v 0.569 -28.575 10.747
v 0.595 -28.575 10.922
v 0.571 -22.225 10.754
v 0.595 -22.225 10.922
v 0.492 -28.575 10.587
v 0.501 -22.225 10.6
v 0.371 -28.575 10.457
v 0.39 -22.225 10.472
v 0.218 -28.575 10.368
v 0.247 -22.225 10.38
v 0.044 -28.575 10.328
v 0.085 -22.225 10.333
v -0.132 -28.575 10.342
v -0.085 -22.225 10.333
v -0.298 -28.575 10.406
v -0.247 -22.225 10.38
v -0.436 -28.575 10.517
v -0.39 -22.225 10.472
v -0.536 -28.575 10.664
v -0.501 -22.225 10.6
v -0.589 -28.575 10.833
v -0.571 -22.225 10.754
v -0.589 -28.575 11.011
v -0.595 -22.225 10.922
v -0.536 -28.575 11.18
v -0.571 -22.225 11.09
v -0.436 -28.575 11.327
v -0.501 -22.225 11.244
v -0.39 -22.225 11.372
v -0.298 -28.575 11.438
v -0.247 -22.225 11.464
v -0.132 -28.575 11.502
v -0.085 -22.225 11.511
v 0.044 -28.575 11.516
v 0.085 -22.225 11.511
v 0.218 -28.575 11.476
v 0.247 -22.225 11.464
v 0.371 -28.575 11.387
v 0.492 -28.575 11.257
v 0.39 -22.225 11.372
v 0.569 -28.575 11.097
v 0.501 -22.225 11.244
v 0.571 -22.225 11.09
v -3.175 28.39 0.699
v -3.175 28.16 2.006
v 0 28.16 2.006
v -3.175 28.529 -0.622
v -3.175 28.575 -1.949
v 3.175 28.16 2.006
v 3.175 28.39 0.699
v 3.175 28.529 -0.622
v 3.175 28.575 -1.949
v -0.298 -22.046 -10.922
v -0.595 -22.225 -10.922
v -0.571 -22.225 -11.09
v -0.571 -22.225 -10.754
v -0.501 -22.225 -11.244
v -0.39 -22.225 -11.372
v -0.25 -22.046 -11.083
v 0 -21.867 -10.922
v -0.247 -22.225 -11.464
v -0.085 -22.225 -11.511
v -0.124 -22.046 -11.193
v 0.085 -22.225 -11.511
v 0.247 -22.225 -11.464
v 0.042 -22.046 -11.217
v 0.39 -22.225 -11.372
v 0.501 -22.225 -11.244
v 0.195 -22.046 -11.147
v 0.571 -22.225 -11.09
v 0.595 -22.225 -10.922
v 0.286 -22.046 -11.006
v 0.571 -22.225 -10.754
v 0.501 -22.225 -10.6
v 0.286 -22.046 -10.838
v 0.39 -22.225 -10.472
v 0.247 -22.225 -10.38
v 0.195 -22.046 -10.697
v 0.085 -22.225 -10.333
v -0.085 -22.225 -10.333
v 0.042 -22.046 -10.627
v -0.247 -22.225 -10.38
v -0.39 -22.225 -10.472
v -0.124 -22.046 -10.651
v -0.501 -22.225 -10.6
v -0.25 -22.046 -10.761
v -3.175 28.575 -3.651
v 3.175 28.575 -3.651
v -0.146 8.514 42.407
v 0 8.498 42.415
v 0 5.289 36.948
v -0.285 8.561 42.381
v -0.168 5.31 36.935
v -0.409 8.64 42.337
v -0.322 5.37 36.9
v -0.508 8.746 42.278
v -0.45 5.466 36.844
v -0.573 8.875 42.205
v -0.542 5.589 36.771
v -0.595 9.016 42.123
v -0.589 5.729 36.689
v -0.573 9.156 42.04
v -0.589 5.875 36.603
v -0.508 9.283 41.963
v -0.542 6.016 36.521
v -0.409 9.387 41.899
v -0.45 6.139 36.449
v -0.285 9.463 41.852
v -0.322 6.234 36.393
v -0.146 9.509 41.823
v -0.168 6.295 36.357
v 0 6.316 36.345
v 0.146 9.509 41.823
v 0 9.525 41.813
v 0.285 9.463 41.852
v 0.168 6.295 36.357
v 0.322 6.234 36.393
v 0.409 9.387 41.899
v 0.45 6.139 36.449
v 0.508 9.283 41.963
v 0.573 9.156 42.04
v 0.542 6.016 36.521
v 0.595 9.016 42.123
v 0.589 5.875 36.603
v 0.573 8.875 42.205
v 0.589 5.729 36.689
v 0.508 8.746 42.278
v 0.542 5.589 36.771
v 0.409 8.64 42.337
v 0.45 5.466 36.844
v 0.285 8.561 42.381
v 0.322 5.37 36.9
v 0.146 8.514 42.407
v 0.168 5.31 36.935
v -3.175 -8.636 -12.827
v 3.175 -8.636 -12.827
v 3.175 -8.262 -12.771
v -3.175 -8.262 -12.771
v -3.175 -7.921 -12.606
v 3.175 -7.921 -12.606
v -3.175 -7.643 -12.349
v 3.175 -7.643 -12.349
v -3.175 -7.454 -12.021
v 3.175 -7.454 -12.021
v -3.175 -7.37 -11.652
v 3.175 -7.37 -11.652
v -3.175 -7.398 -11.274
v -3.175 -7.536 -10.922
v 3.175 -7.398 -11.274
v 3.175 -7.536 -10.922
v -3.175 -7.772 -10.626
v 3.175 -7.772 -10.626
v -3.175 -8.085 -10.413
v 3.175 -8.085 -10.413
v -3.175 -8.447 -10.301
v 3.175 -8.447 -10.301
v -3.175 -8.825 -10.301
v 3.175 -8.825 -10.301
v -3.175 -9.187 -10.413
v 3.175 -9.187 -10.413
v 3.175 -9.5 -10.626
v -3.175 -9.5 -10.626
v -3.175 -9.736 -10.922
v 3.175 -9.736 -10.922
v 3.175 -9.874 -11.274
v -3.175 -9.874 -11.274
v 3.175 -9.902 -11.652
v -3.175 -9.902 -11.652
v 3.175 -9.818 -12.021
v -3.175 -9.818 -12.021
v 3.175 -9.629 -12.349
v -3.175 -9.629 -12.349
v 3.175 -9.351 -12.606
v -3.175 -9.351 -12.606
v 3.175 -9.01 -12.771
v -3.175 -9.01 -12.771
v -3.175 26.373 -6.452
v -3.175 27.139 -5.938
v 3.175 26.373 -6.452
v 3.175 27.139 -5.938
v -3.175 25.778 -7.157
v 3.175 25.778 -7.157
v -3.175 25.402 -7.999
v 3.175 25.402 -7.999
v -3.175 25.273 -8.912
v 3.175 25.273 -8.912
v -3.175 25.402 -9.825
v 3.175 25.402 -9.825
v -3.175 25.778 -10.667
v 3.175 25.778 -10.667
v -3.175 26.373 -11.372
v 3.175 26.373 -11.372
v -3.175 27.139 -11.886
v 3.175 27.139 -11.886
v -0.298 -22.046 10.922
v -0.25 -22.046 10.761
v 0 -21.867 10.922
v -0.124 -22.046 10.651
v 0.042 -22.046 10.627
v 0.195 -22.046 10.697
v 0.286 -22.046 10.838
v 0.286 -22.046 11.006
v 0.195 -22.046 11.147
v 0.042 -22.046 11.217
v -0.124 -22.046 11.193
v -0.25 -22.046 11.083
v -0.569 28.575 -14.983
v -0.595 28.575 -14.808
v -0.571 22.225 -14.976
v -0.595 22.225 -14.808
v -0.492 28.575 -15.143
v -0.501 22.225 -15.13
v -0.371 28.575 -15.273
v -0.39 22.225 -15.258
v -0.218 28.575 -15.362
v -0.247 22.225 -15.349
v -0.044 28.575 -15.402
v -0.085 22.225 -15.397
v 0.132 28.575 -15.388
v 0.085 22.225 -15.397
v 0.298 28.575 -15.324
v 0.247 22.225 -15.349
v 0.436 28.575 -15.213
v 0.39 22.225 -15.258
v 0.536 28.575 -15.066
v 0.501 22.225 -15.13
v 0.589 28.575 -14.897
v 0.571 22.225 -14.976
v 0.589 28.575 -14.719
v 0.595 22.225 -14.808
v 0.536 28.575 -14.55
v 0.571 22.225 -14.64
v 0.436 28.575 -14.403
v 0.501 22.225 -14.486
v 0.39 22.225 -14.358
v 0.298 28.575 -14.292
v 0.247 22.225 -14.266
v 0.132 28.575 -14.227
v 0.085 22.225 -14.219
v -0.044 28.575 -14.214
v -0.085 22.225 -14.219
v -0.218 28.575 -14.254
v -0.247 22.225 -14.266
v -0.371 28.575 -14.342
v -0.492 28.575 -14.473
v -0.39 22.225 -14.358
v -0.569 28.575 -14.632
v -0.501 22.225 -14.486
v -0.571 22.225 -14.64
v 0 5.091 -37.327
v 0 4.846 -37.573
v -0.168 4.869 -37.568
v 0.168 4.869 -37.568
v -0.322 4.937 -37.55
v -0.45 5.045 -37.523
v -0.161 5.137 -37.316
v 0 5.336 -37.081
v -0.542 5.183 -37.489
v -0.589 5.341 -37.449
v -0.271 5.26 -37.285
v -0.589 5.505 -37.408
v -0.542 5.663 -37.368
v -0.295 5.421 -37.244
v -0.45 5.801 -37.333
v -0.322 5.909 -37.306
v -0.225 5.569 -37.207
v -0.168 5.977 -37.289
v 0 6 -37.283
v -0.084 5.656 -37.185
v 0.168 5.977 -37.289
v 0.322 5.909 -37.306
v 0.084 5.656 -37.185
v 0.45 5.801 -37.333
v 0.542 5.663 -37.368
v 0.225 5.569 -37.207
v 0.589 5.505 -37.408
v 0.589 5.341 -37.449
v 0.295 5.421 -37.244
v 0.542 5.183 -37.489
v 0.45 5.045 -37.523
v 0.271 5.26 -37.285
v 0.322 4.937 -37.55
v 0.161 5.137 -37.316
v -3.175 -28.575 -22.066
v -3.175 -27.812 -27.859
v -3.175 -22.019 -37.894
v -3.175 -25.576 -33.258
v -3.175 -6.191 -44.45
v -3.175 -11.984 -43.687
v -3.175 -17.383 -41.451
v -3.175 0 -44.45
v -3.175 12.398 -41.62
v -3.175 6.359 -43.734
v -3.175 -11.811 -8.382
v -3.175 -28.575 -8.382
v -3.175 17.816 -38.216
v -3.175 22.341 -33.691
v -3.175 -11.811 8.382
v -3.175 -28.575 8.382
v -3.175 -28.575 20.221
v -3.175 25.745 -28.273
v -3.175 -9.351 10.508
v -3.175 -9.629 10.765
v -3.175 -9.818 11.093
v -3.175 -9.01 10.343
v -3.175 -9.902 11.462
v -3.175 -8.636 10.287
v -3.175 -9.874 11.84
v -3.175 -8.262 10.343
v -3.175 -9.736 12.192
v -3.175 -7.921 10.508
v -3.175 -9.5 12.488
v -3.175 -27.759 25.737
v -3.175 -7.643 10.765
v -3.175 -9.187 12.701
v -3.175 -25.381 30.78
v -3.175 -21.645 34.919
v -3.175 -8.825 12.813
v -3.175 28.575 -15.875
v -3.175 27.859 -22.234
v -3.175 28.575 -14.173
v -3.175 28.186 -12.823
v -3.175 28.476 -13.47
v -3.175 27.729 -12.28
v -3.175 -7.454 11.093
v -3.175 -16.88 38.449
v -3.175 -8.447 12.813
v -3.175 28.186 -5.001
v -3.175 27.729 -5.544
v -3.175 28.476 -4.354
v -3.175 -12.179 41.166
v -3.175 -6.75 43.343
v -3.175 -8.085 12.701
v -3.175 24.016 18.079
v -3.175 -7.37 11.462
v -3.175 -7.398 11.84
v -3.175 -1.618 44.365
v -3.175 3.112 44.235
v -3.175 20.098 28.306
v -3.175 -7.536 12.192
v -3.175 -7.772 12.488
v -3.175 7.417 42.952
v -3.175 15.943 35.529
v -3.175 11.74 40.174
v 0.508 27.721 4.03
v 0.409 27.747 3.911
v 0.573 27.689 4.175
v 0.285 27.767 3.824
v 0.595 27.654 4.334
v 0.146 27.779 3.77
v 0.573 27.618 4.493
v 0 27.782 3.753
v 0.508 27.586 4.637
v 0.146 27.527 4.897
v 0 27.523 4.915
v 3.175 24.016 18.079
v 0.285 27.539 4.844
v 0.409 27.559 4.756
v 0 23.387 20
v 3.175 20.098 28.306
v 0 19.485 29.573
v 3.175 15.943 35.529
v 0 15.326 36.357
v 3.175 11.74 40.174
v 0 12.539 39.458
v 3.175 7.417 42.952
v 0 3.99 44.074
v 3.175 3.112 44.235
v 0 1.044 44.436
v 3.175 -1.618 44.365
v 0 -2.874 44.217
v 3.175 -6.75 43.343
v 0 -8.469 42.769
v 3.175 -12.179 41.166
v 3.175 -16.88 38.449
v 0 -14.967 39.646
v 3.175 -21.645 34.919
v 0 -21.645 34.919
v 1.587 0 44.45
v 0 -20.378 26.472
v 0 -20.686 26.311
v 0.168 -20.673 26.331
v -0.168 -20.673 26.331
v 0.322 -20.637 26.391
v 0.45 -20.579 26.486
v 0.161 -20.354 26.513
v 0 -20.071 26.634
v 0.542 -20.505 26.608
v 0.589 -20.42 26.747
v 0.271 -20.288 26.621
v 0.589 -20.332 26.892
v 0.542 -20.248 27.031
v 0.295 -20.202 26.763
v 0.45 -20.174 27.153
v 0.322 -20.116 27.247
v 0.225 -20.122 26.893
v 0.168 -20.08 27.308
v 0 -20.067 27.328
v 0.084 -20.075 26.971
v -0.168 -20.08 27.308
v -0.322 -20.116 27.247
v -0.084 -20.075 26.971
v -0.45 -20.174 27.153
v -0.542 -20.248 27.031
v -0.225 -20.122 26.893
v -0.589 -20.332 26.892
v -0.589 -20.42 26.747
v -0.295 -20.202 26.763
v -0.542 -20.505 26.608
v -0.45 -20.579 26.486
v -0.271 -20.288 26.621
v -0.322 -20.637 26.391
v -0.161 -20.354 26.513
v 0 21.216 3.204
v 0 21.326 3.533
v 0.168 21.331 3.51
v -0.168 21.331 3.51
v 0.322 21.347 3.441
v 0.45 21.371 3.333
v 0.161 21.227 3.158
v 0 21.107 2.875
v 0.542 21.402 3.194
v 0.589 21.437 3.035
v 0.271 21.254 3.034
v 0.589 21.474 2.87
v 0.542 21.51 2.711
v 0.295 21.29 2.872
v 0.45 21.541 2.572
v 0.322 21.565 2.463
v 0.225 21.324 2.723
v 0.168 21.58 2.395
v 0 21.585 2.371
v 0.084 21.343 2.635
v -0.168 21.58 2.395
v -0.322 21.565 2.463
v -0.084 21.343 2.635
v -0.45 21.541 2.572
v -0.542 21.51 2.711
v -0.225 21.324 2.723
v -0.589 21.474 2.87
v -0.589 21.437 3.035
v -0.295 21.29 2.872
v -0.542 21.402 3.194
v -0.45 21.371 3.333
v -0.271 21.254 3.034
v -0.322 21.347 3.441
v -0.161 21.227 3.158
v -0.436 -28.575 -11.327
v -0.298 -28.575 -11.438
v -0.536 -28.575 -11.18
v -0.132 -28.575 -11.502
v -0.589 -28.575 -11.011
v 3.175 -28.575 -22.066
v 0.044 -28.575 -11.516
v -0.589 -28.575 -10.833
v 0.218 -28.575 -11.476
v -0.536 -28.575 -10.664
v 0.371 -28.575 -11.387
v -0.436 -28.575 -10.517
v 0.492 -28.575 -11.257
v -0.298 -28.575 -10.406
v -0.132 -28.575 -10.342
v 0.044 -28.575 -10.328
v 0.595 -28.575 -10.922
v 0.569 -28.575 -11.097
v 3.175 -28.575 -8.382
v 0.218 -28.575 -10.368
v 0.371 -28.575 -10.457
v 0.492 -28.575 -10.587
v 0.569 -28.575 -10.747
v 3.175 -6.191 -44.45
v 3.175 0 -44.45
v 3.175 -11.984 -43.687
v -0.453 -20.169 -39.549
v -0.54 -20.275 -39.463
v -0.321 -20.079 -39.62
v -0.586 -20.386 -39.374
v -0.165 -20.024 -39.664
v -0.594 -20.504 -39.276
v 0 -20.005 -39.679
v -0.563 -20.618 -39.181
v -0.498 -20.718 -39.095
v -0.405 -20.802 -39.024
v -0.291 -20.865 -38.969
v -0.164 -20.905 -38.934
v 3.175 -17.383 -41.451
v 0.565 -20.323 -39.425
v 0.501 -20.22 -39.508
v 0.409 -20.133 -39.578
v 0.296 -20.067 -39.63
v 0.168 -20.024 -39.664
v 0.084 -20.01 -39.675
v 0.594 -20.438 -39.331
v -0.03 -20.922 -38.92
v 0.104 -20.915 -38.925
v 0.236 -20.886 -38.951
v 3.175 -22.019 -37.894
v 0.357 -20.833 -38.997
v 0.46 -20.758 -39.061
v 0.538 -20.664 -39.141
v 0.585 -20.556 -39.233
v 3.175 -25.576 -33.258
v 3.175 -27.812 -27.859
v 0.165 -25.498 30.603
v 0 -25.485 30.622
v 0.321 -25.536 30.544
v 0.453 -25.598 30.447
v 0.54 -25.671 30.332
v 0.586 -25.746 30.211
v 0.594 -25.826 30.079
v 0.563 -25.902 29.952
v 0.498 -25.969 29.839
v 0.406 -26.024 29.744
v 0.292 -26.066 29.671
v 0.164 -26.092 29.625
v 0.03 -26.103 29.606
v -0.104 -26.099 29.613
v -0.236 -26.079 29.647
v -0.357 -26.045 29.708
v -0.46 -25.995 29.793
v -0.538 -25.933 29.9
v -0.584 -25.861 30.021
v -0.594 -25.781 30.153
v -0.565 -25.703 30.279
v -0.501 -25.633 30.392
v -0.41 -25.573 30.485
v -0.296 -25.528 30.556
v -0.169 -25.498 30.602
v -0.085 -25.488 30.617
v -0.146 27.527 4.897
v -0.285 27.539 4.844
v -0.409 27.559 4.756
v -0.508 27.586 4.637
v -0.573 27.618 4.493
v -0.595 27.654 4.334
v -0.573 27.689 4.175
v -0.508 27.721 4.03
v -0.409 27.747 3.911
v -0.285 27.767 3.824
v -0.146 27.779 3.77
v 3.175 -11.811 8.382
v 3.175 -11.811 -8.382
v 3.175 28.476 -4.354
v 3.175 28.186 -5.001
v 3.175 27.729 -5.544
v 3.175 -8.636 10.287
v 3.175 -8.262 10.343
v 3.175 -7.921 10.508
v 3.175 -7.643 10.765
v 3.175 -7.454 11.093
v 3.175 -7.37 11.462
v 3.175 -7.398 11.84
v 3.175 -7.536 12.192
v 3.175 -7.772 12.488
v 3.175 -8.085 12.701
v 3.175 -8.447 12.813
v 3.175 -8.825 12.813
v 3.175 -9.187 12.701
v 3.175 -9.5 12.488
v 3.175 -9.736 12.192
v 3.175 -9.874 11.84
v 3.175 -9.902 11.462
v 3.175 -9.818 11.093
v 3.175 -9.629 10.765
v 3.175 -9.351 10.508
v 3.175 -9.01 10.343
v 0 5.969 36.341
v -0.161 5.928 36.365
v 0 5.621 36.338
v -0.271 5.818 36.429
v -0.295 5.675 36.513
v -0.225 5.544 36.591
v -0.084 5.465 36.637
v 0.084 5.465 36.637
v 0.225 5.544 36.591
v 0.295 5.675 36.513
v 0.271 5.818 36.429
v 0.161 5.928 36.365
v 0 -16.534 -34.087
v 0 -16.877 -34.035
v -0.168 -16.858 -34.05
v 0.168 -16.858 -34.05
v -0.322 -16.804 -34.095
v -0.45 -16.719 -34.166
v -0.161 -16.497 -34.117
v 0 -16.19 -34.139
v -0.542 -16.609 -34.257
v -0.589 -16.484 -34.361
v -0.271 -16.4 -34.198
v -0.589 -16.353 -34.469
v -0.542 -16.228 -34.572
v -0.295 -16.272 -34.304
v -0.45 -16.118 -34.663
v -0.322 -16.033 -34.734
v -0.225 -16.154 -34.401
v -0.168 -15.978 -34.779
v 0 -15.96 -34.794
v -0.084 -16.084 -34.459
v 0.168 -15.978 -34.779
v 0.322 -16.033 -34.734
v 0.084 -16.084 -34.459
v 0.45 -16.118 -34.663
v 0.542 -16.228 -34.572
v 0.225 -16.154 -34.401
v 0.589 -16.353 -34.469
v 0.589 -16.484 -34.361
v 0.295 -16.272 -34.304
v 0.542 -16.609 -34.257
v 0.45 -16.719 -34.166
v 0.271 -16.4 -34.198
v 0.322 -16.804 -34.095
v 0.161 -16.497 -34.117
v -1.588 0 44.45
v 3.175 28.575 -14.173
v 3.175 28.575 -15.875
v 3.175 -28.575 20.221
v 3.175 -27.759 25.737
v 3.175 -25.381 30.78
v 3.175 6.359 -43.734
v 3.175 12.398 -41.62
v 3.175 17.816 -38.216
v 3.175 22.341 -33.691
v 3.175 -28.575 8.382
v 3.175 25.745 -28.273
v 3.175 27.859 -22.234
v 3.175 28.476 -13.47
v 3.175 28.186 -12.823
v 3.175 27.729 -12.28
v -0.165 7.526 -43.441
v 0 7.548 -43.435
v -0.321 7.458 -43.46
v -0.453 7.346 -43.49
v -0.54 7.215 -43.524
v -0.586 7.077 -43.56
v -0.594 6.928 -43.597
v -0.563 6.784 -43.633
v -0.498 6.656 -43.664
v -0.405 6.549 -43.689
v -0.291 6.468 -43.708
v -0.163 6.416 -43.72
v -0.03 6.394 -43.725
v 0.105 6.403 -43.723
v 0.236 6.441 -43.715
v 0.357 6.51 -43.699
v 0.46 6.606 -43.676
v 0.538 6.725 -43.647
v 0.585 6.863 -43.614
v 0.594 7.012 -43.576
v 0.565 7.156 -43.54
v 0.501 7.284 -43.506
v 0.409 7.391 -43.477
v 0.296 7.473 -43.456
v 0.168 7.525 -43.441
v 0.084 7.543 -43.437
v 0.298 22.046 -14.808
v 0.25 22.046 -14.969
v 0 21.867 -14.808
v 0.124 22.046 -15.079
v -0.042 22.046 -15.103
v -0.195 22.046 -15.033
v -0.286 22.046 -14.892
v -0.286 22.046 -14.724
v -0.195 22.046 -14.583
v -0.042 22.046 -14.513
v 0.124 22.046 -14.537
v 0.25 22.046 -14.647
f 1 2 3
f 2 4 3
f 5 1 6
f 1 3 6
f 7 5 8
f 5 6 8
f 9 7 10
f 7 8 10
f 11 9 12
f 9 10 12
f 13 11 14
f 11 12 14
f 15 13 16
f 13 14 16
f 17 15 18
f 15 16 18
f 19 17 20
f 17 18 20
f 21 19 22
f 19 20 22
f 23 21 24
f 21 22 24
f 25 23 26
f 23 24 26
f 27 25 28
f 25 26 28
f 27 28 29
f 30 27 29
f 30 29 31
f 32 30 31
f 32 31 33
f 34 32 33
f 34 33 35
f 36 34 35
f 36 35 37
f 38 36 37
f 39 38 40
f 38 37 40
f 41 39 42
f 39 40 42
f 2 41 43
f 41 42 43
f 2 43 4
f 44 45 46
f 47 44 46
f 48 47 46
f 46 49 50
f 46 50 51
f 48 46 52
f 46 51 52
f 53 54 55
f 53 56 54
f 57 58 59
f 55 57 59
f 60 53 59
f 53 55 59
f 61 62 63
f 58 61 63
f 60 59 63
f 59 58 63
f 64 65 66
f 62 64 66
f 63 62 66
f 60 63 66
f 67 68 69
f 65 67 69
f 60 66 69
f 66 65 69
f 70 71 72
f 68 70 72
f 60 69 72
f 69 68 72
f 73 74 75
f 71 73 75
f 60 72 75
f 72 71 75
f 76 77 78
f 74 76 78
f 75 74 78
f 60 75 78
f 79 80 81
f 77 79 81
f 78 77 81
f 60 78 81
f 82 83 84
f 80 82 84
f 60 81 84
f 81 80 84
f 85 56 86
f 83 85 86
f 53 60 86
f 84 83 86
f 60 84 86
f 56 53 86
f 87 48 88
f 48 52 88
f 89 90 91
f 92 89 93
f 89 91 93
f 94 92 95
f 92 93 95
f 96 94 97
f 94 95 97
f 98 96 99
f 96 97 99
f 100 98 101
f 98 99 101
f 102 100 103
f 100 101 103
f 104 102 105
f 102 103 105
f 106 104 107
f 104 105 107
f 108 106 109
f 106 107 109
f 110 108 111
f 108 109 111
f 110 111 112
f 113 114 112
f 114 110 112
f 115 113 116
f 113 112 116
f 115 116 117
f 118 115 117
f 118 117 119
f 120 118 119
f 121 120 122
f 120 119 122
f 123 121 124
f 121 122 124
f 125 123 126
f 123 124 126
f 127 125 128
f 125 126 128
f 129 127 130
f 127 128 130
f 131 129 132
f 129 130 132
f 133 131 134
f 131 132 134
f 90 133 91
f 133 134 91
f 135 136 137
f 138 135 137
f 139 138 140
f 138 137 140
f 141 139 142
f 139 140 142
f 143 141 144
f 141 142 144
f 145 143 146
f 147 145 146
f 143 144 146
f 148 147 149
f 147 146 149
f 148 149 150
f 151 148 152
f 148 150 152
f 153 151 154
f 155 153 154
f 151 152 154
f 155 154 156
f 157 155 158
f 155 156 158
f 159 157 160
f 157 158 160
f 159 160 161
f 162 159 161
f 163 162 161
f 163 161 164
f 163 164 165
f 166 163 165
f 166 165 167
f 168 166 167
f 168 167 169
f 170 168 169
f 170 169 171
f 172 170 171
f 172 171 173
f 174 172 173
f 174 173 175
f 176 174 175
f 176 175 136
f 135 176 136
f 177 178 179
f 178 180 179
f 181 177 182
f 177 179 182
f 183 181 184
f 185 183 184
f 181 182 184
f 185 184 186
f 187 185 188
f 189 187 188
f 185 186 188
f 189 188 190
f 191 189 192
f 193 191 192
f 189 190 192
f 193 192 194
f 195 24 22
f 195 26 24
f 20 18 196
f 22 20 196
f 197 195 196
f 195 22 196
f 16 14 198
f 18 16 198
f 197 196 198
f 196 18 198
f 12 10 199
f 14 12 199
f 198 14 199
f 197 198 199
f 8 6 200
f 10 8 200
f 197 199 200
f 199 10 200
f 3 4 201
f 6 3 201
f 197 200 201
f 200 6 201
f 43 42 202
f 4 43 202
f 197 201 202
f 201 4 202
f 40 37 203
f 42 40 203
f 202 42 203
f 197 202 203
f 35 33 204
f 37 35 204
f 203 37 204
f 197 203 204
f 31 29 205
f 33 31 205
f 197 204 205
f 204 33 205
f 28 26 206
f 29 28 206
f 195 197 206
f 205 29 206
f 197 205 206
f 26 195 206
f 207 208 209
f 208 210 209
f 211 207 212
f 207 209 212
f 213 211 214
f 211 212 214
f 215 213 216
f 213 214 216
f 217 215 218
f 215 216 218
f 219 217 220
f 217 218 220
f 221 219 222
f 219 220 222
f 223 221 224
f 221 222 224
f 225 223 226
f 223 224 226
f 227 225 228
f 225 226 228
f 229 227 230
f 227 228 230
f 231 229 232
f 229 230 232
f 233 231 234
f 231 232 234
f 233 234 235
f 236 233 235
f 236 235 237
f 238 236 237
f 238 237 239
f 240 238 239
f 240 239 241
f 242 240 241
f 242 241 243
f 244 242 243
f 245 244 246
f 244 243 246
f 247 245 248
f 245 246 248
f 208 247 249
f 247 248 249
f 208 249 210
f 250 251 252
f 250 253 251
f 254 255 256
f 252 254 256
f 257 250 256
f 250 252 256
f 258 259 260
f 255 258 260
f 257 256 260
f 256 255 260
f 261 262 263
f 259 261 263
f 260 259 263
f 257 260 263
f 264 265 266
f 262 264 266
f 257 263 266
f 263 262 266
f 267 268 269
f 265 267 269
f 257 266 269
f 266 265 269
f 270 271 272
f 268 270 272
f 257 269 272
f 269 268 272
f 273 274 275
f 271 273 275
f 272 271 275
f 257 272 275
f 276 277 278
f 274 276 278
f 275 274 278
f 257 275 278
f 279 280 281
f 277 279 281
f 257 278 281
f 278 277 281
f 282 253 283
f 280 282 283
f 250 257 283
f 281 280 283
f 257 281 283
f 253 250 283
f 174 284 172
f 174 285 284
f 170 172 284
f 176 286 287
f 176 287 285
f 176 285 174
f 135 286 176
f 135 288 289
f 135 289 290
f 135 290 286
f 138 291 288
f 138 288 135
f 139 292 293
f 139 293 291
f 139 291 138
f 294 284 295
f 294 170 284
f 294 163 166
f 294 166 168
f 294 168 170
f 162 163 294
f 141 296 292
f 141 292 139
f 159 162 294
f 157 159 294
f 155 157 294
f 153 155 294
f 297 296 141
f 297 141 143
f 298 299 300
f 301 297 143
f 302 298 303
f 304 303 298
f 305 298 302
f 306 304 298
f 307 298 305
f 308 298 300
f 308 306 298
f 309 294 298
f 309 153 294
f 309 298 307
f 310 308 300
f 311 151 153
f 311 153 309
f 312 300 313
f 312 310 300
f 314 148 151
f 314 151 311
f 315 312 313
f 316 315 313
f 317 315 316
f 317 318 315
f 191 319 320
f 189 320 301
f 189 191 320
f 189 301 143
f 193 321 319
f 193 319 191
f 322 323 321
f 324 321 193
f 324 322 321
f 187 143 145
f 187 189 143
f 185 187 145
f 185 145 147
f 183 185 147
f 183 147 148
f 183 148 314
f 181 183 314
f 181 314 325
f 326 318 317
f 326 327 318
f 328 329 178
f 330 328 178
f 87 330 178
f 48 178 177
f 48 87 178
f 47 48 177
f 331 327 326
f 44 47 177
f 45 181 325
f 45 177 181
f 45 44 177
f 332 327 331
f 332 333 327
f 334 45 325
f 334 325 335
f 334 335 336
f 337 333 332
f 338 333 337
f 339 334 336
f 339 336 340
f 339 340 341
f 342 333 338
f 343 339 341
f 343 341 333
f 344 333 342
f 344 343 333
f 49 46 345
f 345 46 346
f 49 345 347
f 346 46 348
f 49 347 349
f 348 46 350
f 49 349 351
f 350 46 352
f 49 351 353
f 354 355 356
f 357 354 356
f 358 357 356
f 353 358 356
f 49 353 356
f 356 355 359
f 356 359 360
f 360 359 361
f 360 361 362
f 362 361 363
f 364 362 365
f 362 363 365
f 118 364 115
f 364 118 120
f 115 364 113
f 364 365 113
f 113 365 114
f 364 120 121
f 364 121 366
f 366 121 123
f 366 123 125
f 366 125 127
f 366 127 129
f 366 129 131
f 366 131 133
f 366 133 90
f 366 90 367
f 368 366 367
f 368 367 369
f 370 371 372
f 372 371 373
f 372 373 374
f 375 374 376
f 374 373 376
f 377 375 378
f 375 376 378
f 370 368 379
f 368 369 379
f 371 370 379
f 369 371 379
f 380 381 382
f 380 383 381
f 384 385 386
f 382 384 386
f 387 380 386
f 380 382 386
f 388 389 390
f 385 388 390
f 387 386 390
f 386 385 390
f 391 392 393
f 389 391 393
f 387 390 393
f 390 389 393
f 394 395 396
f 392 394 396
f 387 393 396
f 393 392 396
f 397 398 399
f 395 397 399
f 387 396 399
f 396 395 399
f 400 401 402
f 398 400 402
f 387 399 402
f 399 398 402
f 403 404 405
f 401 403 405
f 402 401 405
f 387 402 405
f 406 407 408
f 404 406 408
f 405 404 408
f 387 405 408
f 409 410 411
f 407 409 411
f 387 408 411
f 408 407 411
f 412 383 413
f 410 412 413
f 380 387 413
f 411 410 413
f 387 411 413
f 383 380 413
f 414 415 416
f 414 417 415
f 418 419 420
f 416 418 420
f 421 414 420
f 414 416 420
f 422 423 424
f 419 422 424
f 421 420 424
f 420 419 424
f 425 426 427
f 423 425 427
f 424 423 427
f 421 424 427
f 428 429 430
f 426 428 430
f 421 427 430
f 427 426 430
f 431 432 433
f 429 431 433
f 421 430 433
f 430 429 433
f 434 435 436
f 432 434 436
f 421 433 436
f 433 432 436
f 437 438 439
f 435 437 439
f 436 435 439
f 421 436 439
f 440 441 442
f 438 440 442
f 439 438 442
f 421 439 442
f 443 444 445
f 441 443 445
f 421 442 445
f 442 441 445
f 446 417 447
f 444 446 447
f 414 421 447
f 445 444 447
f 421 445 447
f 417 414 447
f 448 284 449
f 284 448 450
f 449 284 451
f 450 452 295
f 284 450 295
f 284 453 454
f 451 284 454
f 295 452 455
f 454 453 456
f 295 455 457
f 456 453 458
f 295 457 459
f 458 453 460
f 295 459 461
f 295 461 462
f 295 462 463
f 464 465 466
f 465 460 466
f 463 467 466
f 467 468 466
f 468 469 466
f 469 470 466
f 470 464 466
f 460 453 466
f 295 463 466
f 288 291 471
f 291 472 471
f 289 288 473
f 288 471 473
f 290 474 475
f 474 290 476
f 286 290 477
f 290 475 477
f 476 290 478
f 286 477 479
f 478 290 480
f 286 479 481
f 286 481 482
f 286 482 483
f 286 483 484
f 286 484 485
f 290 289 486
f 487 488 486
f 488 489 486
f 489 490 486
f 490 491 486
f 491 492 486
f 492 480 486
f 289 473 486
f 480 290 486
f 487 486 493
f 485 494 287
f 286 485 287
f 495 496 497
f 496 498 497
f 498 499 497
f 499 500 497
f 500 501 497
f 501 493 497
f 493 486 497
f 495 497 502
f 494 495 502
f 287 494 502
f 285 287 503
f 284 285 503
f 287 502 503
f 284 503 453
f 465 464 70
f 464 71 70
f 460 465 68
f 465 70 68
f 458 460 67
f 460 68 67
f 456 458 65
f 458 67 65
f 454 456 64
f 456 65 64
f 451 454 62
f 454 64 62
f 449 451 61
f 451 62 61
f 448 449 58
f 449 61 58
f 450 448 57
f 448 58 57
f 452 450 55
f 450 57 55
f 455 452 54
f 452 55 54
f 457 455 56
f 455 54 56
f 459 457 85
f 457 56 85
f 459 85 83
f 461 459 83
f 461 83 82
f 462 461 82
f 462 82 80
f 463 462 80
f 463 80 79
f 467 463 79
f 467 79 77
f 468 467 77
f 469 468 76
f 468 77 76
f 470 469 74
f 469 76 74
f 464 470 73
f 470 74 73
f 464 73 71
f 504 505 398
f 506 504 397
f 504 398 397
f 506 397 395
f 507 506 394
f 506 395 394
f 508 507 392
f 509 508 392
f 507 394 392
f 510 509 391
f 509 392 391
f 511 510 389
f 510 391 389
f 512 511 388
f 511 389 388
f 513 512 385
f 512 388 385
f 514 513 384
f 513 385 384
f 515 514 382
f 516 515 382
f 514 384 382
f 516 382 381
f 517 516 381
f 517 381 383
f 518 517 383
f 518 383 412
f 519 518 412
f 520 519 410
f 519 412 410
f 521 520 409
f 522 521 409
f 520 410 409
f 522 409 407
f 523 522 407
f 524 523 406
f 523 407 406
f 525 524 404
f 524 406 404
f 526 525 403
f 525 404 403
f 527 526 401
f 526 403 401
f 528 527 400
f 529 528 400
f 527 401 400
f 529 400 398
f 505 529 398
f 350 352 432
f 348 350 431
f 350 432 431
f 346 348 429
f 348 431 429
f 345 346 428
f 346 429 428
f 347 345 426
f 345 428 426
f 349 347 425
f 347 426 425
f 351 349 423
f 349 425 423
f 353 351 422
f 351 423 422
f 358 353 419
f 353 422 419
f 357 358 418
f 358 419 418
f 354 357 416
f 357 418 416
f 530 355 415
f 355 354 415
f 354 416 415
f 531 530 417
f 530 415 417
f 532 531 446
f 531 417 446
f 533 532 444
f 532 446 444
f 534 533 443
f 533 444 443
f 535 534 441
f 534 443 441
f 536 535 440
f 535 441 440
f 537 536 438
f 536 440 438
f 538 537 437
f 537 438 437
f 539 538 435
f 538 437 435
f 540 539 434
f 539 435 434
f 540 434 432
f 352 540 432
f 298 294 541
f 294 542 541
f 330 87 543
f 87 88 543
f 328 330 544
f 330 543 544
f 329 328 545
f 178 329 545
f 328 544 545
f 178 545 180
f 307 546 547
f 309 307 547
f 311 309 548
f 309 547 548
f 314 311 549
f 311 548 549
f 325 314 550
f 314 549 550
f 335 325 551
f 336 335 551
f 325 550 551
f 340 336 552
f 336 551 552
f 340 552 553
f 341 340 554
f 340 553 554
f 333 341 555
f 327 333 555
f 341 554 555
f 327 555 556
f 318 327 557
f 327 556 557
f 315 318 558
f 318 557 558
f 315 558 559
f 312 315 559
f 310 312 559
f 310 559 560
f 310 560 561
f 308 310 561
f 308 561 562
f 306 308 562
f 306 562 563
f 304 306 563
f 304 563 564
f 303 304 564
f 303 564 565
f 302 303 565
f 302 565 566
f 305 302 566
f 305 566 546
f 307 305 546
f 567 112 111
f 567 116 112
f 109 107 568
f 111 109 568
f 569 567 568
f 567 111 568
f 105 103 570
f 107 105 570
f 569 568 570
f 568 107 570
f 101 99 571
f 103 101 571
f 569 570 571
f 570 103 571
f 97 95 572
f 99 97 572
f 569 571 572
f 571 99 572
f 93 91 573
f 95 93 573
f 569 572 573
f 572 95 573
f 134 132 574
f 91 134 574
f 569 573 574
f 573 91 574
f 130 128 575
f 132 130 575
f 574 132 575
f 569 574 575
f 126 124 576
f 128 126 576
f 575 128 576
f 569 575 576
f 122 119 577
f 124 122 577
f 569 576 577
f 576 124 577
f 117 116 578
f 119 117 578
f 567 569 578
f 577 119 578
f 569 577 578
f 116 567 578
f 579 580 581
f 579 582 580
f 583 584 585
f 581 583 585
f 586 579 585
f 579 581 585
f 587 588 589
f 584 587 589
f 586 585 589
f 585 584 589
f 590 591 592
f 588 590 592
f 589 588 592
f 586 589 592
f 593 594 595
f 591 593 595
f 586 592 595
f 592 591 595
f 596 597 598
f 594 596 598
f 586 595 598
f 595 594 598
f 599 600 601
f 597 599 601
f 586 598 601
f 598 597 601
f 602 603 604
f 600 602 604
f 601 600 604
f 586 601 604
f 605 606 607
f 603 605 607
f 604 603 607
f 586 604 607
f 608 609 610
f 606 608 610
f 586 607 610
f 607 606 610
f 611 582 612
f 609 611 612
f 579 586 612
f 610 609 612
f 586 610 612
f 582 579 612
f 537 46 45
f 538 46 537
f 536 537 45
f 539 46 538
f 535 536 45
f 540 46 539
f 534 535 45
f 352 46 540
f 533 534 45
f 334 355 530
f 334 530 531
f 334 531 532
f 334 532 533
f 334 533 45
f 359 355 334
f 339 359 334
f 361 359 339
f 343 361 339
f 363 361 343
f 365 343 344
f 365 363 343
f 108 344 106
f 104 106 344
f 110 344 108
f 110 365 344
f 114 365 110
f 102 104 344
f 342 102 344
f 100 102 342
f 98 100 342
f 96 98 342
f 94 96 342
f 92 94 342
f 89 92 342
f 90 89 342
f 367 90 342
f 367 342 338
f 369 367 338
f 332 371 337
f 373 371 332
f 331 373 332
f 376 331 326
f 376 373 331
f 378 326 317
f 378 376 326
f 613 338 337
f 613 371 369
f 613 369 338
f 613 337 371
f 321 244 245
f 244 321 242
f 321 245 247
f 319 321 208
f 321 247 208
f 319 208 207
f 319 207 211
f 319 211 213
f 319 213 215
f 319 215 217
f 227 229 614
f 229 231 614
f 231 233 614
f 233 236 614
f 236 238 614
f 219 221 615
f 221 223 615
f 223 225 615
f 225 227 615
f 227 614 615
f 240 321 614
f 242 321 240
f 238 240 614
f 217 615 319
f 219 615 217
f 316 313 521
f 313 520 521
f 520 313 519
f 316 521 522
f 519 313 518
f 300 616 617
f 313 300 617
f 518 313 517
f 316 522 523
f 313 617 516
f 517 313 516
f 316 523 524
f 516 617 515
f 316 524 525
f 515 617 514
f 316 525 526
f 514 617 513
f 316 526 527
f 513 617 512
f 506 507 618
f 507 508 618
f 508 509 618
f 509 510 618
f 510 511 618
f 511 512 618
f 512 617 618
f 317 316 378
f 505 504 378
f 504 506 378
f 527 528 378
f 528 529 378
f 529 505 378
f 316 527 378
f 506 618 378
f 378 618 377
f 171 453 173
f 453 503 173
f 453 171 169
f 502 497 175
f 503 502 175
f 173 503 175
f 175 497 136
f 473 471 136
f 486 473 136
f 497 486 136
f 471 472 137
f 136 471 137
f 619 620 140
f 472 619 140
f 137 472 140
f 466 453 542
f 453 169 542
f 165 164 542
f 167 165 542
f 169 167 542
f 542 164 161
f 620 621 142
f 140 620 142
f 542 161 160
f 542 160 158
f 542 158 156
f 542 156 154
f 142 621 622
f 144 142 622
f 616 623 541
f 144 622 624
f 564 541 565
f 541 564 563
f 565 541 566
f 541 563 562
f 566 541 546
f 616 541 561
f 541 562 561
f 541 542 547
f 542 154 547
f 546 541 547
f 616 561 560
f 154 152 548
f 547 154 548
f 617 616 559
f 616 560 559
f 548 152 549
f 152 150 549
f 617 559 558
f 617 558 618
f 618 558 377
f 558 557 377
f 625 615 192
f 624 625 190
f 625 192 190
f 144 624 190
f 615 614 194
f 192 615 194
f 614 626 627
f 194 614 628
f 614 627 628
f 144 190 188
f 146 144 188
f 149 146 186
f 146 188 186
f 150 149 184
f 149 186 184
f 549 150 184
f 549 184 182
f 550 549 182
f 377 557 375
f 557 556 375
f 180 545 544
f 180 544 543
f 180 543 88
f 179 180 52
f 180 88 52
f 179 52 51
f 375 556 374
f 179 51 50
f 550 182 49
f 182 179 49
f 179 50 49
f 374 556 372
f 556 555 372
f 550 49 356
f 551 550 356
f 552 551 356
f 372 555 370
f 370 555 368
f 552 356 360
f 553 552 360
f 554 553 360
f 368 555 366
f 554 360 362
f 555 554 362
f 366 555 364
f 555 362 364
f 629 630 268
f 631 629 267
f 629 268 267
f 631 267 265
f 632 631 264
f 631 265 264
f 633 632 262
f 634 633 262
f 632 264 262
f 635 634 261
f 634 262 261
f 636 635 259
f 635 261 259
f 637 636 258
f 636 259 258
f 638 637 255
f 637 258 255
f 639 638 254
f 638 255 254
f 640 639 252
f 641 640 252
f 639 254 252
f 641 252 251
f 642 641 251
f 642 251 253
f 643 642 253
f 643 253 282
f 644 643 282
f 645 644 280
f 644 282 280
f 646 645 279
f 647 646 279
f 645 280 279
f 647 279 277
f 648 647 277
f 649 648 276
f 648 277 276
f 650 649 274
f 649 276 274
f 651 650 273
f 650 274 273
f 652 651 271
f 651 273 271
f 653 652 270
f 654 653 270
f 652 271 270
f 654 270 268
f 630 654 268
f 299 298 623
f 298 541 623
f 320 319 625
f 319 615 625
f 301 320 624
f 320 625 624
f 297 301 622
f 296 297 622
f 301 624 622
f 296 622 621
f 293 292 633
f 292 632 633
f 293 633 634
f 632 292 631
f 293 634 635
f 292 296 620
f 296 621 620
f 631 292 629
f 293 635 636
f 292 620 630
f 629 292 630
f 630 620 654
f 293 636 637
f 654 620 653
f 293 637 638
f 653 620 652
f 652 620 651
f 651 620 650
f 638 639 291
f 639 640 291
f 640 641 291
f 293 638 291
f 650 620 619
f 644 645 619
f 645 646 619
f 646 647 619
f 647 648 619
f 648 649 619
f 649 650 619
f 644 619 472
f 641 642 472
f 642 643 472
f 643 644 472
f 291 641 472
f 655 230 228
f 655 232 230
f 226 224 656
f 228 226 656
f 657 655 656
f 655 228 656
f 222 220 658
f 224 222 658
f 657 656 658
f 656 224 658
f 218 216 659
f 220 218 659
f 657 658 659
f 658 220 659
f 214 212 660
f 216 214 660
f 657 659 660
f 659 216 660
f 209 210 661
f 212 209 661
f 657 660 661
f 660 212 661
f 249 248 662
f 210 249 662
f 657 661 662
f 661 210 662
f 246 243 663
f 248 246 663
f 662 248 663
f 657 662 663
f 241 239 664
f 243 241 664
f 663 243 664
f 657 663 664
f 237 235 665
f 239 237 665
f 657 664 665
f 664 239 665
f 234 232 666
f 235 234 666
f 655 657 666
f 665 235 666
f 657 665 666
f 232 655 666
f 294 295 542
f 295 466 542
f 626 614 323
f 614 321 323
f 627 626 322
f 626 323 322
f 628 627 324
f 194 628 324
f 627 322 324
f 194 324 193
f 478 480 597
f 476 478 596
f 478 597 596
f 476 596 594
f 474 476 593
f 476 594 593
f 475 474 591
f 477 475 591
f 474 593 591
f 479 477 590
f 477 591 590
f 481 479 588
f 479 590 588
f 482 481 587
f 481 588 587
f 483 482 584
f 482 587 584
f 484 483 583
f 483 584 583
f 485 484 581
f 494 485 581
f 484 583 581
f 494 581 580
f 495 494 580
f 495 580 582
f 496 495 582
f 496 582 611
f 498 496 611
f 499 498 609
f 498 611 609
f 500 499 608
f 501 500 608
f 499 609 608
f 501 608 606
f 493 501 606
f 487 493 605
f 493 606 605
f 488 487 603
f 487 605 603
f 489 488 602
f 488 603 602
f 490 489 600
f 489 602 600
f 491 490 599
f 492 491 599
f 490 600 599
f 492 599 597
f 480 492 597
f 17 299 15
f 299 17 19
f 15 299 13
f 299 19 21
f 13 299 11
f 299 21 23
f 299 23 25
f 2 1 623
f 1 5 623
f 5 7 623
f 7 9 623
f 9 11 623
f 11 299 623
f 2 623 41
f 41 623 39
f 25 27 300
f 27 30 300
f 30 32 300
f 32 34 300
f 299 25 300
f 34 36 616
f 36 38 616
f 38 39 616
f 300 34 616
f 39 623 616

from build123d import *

# Parameters (mm, degrees)
BOSS_EXTRUDE1_DEPTH                  = 3.175
SKETCH2_R                            = 3.302
CUT_EXTRUDE1_DEPTH                   = 7.3500001
FILLET1_R                            = 2.54
SKETCH3_R                            = 1.27
CUT_EXTRUDE2_DEPTH                   = 7.3500001
F_3_64_0_04688_DIAMETER_HOLE4_D      = 1.190752
F_3_64_0_04688_DIAMETER_HOLE4_DEPTH  = 6.35
F_3_64_0_04688_DIAMETER_HOLE4_TIP    = 0.357737992
F_3_64_0_04688_DIAMETER_HOLE5_D      = 1.190752
F_3_64_0_04688_DIAMETER_HOLE5_DEPTH  = 6.35
F_3_64_0_04688_DIAMETER_HOLE5_TIP    = 0.357737992
F_3_64_0_04688_DIAMETER_HOLE8_D      = 1.190752
F_3_64_0_04688_DIAMETER_HOLE8_DEPTH  = 6.35
F_3_64_0_04688_DIAMETER_HOLE8_TIP    = 0.357737992
F_3_64_0_04688_DIAMETER_HOLE10_D     = 1.190752
F_3_64_0_04688_DIAMETER_HOLE10_DEPTH = 6.35
F_3_64_0_04688_DIAMETER_HOLE10_TIP   = 0.357737992
F_3_64_0_04688_DIAMETER_HOLE11_D     = 1.190752
F_3_64_0_04688_DIAMETER_HOLE11_DEPTH = 6.35
F_3_64_0_04688_DIAMETER_HOLE11_TIP   = 0.357737992
F_3_64_0_04688_DIAMETER_HOLE12_D     = 1.190752
F_3_64_0_04688_DIAMETER_HOLE12_DEPTH = 6.35
F_3_64_0_04688_DIAMETER_HOLE12_TIP   = 0.357737992
F_3_64_0_04688_DIAMETER_HOLE13_D     = 1.190752
F_3_64_0_04688_DIAMETER_HOLE13_DEPTH = 6.35
F_3_64_0_04688_DIAMETER_HOLE13_TIP   = 0.357737992
F_3_64_0_04688_DIAMETER_HOLE14_D     = 1.190752
F_3_64_0_04688_DIAMETER_HOLE14_DEPTH = 6.35
F_3_64_0_04688_DIAMETER_HOLE14_TIP   = 0.357737992


with BuildPart() as part:
    # Sketch1 → Boss-Extrude1 (new body, symmetric)
    with BuildSketch(Plane(origin=(0, 0, 0), x_dir=(0, 0, -1), z_dir=(1, 0, 0))):
        with BuildLine():
            ThreePointArc((-2.006494412, 28.159824422), (-0.039619207, 28.470921794), (1.948985172, 28.575))
            Line((1.948985172, 28.575), (15.875, 28.575))
            ThreePointArc((15.875, 28.575), (36.080576272, 20.205576272), (44.45, 0))
            Line((44.45, 0), (44.45, -6.190753211))
            ThreePointArc((44.45, -6.190753211), (37.893805907, -22.018805907), (22.065753211, -28.575))
            Line((22.065753211, -28.575), (8.382, -28.575))
            Line((8.382, -28.575), (8.382, -11.811))
            Line((8.382, -11.811), (-8.382, -11.811))
            Line((-8.382, -11.811), (-8.382, -28.575))
            Line((-8.382, -28.575), (-20.221173657, -28.575))
            ThreePointArc((-20.221173657, -28.575), (-28.345832171, -26.755566561), (-34.918545763, -21.644808297))
            add(Edge.make_bspline(
                [(-2.006494412, 28.159824422), (-30.496101023, 22.112541402), (-51.196498918, 9.980376605), (-41.193293746, -14.035586788), (-34.918545763, -21.644808297)],
                knots=[0.014282519, 0.014282519, 0.014282519, 0.014282519, 0.629767973, 0.915551688, 0.915551688, 0.915551688, 0.915551688], degree=3))
        make_face()
    extrude(amount=BOSS_EXTRUDE1_DEPTH, both=True)

    # Sketch2 → Cut-Extrude1 (cut, through all)
    with BuildSketch(Plane(origin=(3.175, 0, 0), x_dir=(0, 0, -1), z_dir=(1, 0, 0))):
        with Locations((8.911992586, 28.575)):
            Circle(SKETCH2_R)
    extrude(amount=-CUT_EXTRUDE1_DEPTH, mode=Mode.SUBTRACT)

    # Fillet1
    fillet1_edges = [part.edges().sort_by_distance(p)[0] for p in [
        (0, 28.575, -5.609992586),
        (0, 28.575, -12.213992586),
    ]]
    fillet(fillet1_edges, radius=FILLET1_R)

    # Sketch3 → Cut-Extrude2 (cut, through all)
    with BuildSketch(Plane(origin=(3.175, 0, 0), x_dir=(0, 0, -1), z_dir=(1, 0, 0))):
        with Locations((11.557, -8.636)):
            Circle(SKETCH3_R)
        with Locations((-11.557, -8.636)):
            Circle(SKETCH3_R)
    extrude(amount=-CUT_EXTRUDE2_DEPTH, mode=Mode.SUBTRACT)

    # 3/64 (0.04688) Diameter Hole4
    with Locations(Plane(origin=(0, 27.653661398, 4.33381955), x_dir=(0, -0.217552501, 0.97604862), z_dir=(0, 0.97604862, 0.217552501))):
        with Locations((0, 0)):
            Hole(F_3_64_0_04688_DIAMETER_HOLE4_D / 2, depth=F_3_64_0_04688_DIAMETER_HOLE4_DEPTH)
            with Locations((0, 0, -(F_3_64_0_04688_DIAMETER_HOLE4_DEPTH + F_3_64_0_04688_DIAMETER_HOLE4_TIP / 2))):  # 118° drill point
                Cone(0, F_3_64_0_04688_DIAMETER_HOLE4_D / 2, F_3_64_0_04688_DIAMETER_HOLE4_TIP, mode=Mode.SUBTRACT)

    # 3/64 (0.04688) Diameter Hole5
    with Locations(Plane(origin=(0, 28.575, 0), x_dir=(1, 0, 0), z_dir=(0, 1, 0))):
        with Locations((0, 14.807920641)):
            Hole(F_3_64_0_04688_DIAMETER_HOLE5_D / 2, depth=F_3_64_0_04688_DIAMETER_HOLE5_DEPTH)
            with Locations((0, 0, -(F_3_64_0_04688_DIAMETER_HOLE5_DEPTH + F_3_64_0_04688_DIAMETER_HOLE5_TIP / 2))):  # 118° drill point
                Cone(0, F_3_64_0_04688_DIAMETER_HOLE5_D / 2, F_3_64_0_04688_DIAMETER_HOLE5_TIP, mode=Mode.SUBTRACT)

    # 3/64 (0.04688) Diameter Hole8
    with Locations(Plane(origin=(0, 6.972553311, -43.58626351), x_dir=(0, -0.969773001, -0.244008865), z_dir=(0, 0.244008865, -0.969773001))):
        with Locations((0, 0)):
            Hole(F_3_64_0_04688_DIAMETER_HOLE8_D / 2, depth=F_3_64_0_04688_DIAMETER_HOLE8_DEPTH)
            with Locations((0, 0, -(F_3_64_0_04688_DIAMETER_HOLE8_DEPTH + F_3_64_0_04688_DIAMETER_HOLE8_TIP / 2))):  # 118° drill point
                Cone(0, F_3_64_0_04688_DIAMETER_HOLE8_D / 2, F_3_64_0_04688_DIAMETER_HOLE8_TIP, mode=Mode.SUBTRACT)

    # 3/64 (0.04688) Diameter Hole10
    with Locations(Plane(origin=(0, -20.468796932, -39.305009918), x_dir=(0, -0.770151297, 0.637861254), z_dir=(0, -0.637861254, -0.770151297))):
        with Locations((0, 0)):
            Hole(F_3_64_0_04688_DIAMETER_HOLE10_D / 2, depth=F_3_64_0_04688_DIAMETER_HOLE10_DEPTH)
            with Locations((0, 0, -(F_3_64_0_04688_DIAMETER_HOLE10_DEPTH + F_3_64_0_04688_DIAMETER_HOLE10_TIP / 2))):  # 118° drill point
                Cone(0, F_3_64_0_04688_DIAMETER_HOLE10_D / 2, F_3_64_0_04688_DIAMETER_HOLE10_TIP, mode=Mode.SUBTRACT)

    # 3/64 (0.04688) Diameter Hole11
    with Locations(Plane(origin=(0, -28.575, 0), x_dir=(-1, 0, 0), z_dir=(0, -1, 0))):
        with Locations((0, 10.922)):
            Hole(F_3_64_0_04688_DIAMETER_HOLE11_D / 2, depth=F_3_64_0_04688_DIAMETER_HOLE11_DEPTH)
            with Locations((0, 0, -(F_3_64_0_04688_DIAMETER_HOLE11_DEPTH + F_3_64_0_04688_DIAMETER_HOLE11_TIP / 2))):  # 118° drill point
                Cone(0, F_3_64_0_04688_DIAMETER_HOLE11_D / 2, F_3_64_0_04688_DIAMETER_HOLE11_TIP, mode=Mode.SUBTRACT)

    # 3/64 (0.04688) Diameter Hole12
    with Locations(Plane(origin=(0, 9.016155881, 42.122855847), x_dir=(0, 0.862463982, -0.506118444), z_dir=(0, 0.506118444, 0.862463982))):
        with Locations((0, 0)):
            Hole(F_3_64_0_04688_DIAMETER_HOLE12_D / 2, depth=F_3_64_0_04688_DIAMETER_HOLE12_DEPTH)
            with Locations((0, 0, -(F_3_64_0_04688_DIAMETER_HOLE12_DEPTH + F_3_64_0_04688_DIAMETER_HOLE12_TIP / 2))):  # 118° drill point
                Cone(0, F_3_64_0_04688_DIAMETER_HOLE12_D / 2, F_3_64_0_04688_DIAMETER_HOLE12_TIP, mode=Mode.SUBTRACT)

    # 3/64 (0.04688) Diameter Hole13
    with Locations(Plane(origin=(0, -25.802087057, 30.118594378), x_dir=(0, -0.519549644, -0.854440265), z_dir=(0, -0.854440265, 0.519549644))):
        with Locations((1e-09, 0)):
            Hole(F_3_64_0_04688_DIAMETER_HOLE13_D / 2, depth=F_3_64_0_04688_DIAMETER_HOLE13_DEPTH)
            with Locations((0, 0, -(F_3_64_0_04688_DIAMETER_HOLE13_DEPTH + F_3_64_0_04688_DIAMETER_HOLE13_TIP / 2))):  # 118° drill point
                Cone(0, F_3_64_0_04688_DIAMETER_HOLE13_D / 2, F_3_64_0_04688_DIAMETER_HOLE13_TIP, mode=Mode.SUBTRACT)

    # 3/64 (0.04688) Diameter Hole14
    with Locations(Plane(origin=(0, -28.575, 0), x_dir=(-1, 0, 0), z_dir=(0, -1, 0))):
        with Locations((0, -10.922)):
            Hole(F_3_64_0_04688_DIAMETER_HOLE14_D / 2, depth=F_3_64_0_04688_DIAMETER_HOLE14_DEPTH)
            with Locations((0, 0, -(F_3_64_0_04688_DIAMETER_HOLE14_DEPTH + F_3_64_0_04688_DIAMETER_HOLE14_TIP / 2))):  # 118° drill point
                Cone(0, F_3_64_0_04688_DIAMETER_HOLE14_D / 2, F_3_64_0_04688_DIAMETER_HOLE14_TIP, mode=Mode.SUBTRACT)


solid = part.part
